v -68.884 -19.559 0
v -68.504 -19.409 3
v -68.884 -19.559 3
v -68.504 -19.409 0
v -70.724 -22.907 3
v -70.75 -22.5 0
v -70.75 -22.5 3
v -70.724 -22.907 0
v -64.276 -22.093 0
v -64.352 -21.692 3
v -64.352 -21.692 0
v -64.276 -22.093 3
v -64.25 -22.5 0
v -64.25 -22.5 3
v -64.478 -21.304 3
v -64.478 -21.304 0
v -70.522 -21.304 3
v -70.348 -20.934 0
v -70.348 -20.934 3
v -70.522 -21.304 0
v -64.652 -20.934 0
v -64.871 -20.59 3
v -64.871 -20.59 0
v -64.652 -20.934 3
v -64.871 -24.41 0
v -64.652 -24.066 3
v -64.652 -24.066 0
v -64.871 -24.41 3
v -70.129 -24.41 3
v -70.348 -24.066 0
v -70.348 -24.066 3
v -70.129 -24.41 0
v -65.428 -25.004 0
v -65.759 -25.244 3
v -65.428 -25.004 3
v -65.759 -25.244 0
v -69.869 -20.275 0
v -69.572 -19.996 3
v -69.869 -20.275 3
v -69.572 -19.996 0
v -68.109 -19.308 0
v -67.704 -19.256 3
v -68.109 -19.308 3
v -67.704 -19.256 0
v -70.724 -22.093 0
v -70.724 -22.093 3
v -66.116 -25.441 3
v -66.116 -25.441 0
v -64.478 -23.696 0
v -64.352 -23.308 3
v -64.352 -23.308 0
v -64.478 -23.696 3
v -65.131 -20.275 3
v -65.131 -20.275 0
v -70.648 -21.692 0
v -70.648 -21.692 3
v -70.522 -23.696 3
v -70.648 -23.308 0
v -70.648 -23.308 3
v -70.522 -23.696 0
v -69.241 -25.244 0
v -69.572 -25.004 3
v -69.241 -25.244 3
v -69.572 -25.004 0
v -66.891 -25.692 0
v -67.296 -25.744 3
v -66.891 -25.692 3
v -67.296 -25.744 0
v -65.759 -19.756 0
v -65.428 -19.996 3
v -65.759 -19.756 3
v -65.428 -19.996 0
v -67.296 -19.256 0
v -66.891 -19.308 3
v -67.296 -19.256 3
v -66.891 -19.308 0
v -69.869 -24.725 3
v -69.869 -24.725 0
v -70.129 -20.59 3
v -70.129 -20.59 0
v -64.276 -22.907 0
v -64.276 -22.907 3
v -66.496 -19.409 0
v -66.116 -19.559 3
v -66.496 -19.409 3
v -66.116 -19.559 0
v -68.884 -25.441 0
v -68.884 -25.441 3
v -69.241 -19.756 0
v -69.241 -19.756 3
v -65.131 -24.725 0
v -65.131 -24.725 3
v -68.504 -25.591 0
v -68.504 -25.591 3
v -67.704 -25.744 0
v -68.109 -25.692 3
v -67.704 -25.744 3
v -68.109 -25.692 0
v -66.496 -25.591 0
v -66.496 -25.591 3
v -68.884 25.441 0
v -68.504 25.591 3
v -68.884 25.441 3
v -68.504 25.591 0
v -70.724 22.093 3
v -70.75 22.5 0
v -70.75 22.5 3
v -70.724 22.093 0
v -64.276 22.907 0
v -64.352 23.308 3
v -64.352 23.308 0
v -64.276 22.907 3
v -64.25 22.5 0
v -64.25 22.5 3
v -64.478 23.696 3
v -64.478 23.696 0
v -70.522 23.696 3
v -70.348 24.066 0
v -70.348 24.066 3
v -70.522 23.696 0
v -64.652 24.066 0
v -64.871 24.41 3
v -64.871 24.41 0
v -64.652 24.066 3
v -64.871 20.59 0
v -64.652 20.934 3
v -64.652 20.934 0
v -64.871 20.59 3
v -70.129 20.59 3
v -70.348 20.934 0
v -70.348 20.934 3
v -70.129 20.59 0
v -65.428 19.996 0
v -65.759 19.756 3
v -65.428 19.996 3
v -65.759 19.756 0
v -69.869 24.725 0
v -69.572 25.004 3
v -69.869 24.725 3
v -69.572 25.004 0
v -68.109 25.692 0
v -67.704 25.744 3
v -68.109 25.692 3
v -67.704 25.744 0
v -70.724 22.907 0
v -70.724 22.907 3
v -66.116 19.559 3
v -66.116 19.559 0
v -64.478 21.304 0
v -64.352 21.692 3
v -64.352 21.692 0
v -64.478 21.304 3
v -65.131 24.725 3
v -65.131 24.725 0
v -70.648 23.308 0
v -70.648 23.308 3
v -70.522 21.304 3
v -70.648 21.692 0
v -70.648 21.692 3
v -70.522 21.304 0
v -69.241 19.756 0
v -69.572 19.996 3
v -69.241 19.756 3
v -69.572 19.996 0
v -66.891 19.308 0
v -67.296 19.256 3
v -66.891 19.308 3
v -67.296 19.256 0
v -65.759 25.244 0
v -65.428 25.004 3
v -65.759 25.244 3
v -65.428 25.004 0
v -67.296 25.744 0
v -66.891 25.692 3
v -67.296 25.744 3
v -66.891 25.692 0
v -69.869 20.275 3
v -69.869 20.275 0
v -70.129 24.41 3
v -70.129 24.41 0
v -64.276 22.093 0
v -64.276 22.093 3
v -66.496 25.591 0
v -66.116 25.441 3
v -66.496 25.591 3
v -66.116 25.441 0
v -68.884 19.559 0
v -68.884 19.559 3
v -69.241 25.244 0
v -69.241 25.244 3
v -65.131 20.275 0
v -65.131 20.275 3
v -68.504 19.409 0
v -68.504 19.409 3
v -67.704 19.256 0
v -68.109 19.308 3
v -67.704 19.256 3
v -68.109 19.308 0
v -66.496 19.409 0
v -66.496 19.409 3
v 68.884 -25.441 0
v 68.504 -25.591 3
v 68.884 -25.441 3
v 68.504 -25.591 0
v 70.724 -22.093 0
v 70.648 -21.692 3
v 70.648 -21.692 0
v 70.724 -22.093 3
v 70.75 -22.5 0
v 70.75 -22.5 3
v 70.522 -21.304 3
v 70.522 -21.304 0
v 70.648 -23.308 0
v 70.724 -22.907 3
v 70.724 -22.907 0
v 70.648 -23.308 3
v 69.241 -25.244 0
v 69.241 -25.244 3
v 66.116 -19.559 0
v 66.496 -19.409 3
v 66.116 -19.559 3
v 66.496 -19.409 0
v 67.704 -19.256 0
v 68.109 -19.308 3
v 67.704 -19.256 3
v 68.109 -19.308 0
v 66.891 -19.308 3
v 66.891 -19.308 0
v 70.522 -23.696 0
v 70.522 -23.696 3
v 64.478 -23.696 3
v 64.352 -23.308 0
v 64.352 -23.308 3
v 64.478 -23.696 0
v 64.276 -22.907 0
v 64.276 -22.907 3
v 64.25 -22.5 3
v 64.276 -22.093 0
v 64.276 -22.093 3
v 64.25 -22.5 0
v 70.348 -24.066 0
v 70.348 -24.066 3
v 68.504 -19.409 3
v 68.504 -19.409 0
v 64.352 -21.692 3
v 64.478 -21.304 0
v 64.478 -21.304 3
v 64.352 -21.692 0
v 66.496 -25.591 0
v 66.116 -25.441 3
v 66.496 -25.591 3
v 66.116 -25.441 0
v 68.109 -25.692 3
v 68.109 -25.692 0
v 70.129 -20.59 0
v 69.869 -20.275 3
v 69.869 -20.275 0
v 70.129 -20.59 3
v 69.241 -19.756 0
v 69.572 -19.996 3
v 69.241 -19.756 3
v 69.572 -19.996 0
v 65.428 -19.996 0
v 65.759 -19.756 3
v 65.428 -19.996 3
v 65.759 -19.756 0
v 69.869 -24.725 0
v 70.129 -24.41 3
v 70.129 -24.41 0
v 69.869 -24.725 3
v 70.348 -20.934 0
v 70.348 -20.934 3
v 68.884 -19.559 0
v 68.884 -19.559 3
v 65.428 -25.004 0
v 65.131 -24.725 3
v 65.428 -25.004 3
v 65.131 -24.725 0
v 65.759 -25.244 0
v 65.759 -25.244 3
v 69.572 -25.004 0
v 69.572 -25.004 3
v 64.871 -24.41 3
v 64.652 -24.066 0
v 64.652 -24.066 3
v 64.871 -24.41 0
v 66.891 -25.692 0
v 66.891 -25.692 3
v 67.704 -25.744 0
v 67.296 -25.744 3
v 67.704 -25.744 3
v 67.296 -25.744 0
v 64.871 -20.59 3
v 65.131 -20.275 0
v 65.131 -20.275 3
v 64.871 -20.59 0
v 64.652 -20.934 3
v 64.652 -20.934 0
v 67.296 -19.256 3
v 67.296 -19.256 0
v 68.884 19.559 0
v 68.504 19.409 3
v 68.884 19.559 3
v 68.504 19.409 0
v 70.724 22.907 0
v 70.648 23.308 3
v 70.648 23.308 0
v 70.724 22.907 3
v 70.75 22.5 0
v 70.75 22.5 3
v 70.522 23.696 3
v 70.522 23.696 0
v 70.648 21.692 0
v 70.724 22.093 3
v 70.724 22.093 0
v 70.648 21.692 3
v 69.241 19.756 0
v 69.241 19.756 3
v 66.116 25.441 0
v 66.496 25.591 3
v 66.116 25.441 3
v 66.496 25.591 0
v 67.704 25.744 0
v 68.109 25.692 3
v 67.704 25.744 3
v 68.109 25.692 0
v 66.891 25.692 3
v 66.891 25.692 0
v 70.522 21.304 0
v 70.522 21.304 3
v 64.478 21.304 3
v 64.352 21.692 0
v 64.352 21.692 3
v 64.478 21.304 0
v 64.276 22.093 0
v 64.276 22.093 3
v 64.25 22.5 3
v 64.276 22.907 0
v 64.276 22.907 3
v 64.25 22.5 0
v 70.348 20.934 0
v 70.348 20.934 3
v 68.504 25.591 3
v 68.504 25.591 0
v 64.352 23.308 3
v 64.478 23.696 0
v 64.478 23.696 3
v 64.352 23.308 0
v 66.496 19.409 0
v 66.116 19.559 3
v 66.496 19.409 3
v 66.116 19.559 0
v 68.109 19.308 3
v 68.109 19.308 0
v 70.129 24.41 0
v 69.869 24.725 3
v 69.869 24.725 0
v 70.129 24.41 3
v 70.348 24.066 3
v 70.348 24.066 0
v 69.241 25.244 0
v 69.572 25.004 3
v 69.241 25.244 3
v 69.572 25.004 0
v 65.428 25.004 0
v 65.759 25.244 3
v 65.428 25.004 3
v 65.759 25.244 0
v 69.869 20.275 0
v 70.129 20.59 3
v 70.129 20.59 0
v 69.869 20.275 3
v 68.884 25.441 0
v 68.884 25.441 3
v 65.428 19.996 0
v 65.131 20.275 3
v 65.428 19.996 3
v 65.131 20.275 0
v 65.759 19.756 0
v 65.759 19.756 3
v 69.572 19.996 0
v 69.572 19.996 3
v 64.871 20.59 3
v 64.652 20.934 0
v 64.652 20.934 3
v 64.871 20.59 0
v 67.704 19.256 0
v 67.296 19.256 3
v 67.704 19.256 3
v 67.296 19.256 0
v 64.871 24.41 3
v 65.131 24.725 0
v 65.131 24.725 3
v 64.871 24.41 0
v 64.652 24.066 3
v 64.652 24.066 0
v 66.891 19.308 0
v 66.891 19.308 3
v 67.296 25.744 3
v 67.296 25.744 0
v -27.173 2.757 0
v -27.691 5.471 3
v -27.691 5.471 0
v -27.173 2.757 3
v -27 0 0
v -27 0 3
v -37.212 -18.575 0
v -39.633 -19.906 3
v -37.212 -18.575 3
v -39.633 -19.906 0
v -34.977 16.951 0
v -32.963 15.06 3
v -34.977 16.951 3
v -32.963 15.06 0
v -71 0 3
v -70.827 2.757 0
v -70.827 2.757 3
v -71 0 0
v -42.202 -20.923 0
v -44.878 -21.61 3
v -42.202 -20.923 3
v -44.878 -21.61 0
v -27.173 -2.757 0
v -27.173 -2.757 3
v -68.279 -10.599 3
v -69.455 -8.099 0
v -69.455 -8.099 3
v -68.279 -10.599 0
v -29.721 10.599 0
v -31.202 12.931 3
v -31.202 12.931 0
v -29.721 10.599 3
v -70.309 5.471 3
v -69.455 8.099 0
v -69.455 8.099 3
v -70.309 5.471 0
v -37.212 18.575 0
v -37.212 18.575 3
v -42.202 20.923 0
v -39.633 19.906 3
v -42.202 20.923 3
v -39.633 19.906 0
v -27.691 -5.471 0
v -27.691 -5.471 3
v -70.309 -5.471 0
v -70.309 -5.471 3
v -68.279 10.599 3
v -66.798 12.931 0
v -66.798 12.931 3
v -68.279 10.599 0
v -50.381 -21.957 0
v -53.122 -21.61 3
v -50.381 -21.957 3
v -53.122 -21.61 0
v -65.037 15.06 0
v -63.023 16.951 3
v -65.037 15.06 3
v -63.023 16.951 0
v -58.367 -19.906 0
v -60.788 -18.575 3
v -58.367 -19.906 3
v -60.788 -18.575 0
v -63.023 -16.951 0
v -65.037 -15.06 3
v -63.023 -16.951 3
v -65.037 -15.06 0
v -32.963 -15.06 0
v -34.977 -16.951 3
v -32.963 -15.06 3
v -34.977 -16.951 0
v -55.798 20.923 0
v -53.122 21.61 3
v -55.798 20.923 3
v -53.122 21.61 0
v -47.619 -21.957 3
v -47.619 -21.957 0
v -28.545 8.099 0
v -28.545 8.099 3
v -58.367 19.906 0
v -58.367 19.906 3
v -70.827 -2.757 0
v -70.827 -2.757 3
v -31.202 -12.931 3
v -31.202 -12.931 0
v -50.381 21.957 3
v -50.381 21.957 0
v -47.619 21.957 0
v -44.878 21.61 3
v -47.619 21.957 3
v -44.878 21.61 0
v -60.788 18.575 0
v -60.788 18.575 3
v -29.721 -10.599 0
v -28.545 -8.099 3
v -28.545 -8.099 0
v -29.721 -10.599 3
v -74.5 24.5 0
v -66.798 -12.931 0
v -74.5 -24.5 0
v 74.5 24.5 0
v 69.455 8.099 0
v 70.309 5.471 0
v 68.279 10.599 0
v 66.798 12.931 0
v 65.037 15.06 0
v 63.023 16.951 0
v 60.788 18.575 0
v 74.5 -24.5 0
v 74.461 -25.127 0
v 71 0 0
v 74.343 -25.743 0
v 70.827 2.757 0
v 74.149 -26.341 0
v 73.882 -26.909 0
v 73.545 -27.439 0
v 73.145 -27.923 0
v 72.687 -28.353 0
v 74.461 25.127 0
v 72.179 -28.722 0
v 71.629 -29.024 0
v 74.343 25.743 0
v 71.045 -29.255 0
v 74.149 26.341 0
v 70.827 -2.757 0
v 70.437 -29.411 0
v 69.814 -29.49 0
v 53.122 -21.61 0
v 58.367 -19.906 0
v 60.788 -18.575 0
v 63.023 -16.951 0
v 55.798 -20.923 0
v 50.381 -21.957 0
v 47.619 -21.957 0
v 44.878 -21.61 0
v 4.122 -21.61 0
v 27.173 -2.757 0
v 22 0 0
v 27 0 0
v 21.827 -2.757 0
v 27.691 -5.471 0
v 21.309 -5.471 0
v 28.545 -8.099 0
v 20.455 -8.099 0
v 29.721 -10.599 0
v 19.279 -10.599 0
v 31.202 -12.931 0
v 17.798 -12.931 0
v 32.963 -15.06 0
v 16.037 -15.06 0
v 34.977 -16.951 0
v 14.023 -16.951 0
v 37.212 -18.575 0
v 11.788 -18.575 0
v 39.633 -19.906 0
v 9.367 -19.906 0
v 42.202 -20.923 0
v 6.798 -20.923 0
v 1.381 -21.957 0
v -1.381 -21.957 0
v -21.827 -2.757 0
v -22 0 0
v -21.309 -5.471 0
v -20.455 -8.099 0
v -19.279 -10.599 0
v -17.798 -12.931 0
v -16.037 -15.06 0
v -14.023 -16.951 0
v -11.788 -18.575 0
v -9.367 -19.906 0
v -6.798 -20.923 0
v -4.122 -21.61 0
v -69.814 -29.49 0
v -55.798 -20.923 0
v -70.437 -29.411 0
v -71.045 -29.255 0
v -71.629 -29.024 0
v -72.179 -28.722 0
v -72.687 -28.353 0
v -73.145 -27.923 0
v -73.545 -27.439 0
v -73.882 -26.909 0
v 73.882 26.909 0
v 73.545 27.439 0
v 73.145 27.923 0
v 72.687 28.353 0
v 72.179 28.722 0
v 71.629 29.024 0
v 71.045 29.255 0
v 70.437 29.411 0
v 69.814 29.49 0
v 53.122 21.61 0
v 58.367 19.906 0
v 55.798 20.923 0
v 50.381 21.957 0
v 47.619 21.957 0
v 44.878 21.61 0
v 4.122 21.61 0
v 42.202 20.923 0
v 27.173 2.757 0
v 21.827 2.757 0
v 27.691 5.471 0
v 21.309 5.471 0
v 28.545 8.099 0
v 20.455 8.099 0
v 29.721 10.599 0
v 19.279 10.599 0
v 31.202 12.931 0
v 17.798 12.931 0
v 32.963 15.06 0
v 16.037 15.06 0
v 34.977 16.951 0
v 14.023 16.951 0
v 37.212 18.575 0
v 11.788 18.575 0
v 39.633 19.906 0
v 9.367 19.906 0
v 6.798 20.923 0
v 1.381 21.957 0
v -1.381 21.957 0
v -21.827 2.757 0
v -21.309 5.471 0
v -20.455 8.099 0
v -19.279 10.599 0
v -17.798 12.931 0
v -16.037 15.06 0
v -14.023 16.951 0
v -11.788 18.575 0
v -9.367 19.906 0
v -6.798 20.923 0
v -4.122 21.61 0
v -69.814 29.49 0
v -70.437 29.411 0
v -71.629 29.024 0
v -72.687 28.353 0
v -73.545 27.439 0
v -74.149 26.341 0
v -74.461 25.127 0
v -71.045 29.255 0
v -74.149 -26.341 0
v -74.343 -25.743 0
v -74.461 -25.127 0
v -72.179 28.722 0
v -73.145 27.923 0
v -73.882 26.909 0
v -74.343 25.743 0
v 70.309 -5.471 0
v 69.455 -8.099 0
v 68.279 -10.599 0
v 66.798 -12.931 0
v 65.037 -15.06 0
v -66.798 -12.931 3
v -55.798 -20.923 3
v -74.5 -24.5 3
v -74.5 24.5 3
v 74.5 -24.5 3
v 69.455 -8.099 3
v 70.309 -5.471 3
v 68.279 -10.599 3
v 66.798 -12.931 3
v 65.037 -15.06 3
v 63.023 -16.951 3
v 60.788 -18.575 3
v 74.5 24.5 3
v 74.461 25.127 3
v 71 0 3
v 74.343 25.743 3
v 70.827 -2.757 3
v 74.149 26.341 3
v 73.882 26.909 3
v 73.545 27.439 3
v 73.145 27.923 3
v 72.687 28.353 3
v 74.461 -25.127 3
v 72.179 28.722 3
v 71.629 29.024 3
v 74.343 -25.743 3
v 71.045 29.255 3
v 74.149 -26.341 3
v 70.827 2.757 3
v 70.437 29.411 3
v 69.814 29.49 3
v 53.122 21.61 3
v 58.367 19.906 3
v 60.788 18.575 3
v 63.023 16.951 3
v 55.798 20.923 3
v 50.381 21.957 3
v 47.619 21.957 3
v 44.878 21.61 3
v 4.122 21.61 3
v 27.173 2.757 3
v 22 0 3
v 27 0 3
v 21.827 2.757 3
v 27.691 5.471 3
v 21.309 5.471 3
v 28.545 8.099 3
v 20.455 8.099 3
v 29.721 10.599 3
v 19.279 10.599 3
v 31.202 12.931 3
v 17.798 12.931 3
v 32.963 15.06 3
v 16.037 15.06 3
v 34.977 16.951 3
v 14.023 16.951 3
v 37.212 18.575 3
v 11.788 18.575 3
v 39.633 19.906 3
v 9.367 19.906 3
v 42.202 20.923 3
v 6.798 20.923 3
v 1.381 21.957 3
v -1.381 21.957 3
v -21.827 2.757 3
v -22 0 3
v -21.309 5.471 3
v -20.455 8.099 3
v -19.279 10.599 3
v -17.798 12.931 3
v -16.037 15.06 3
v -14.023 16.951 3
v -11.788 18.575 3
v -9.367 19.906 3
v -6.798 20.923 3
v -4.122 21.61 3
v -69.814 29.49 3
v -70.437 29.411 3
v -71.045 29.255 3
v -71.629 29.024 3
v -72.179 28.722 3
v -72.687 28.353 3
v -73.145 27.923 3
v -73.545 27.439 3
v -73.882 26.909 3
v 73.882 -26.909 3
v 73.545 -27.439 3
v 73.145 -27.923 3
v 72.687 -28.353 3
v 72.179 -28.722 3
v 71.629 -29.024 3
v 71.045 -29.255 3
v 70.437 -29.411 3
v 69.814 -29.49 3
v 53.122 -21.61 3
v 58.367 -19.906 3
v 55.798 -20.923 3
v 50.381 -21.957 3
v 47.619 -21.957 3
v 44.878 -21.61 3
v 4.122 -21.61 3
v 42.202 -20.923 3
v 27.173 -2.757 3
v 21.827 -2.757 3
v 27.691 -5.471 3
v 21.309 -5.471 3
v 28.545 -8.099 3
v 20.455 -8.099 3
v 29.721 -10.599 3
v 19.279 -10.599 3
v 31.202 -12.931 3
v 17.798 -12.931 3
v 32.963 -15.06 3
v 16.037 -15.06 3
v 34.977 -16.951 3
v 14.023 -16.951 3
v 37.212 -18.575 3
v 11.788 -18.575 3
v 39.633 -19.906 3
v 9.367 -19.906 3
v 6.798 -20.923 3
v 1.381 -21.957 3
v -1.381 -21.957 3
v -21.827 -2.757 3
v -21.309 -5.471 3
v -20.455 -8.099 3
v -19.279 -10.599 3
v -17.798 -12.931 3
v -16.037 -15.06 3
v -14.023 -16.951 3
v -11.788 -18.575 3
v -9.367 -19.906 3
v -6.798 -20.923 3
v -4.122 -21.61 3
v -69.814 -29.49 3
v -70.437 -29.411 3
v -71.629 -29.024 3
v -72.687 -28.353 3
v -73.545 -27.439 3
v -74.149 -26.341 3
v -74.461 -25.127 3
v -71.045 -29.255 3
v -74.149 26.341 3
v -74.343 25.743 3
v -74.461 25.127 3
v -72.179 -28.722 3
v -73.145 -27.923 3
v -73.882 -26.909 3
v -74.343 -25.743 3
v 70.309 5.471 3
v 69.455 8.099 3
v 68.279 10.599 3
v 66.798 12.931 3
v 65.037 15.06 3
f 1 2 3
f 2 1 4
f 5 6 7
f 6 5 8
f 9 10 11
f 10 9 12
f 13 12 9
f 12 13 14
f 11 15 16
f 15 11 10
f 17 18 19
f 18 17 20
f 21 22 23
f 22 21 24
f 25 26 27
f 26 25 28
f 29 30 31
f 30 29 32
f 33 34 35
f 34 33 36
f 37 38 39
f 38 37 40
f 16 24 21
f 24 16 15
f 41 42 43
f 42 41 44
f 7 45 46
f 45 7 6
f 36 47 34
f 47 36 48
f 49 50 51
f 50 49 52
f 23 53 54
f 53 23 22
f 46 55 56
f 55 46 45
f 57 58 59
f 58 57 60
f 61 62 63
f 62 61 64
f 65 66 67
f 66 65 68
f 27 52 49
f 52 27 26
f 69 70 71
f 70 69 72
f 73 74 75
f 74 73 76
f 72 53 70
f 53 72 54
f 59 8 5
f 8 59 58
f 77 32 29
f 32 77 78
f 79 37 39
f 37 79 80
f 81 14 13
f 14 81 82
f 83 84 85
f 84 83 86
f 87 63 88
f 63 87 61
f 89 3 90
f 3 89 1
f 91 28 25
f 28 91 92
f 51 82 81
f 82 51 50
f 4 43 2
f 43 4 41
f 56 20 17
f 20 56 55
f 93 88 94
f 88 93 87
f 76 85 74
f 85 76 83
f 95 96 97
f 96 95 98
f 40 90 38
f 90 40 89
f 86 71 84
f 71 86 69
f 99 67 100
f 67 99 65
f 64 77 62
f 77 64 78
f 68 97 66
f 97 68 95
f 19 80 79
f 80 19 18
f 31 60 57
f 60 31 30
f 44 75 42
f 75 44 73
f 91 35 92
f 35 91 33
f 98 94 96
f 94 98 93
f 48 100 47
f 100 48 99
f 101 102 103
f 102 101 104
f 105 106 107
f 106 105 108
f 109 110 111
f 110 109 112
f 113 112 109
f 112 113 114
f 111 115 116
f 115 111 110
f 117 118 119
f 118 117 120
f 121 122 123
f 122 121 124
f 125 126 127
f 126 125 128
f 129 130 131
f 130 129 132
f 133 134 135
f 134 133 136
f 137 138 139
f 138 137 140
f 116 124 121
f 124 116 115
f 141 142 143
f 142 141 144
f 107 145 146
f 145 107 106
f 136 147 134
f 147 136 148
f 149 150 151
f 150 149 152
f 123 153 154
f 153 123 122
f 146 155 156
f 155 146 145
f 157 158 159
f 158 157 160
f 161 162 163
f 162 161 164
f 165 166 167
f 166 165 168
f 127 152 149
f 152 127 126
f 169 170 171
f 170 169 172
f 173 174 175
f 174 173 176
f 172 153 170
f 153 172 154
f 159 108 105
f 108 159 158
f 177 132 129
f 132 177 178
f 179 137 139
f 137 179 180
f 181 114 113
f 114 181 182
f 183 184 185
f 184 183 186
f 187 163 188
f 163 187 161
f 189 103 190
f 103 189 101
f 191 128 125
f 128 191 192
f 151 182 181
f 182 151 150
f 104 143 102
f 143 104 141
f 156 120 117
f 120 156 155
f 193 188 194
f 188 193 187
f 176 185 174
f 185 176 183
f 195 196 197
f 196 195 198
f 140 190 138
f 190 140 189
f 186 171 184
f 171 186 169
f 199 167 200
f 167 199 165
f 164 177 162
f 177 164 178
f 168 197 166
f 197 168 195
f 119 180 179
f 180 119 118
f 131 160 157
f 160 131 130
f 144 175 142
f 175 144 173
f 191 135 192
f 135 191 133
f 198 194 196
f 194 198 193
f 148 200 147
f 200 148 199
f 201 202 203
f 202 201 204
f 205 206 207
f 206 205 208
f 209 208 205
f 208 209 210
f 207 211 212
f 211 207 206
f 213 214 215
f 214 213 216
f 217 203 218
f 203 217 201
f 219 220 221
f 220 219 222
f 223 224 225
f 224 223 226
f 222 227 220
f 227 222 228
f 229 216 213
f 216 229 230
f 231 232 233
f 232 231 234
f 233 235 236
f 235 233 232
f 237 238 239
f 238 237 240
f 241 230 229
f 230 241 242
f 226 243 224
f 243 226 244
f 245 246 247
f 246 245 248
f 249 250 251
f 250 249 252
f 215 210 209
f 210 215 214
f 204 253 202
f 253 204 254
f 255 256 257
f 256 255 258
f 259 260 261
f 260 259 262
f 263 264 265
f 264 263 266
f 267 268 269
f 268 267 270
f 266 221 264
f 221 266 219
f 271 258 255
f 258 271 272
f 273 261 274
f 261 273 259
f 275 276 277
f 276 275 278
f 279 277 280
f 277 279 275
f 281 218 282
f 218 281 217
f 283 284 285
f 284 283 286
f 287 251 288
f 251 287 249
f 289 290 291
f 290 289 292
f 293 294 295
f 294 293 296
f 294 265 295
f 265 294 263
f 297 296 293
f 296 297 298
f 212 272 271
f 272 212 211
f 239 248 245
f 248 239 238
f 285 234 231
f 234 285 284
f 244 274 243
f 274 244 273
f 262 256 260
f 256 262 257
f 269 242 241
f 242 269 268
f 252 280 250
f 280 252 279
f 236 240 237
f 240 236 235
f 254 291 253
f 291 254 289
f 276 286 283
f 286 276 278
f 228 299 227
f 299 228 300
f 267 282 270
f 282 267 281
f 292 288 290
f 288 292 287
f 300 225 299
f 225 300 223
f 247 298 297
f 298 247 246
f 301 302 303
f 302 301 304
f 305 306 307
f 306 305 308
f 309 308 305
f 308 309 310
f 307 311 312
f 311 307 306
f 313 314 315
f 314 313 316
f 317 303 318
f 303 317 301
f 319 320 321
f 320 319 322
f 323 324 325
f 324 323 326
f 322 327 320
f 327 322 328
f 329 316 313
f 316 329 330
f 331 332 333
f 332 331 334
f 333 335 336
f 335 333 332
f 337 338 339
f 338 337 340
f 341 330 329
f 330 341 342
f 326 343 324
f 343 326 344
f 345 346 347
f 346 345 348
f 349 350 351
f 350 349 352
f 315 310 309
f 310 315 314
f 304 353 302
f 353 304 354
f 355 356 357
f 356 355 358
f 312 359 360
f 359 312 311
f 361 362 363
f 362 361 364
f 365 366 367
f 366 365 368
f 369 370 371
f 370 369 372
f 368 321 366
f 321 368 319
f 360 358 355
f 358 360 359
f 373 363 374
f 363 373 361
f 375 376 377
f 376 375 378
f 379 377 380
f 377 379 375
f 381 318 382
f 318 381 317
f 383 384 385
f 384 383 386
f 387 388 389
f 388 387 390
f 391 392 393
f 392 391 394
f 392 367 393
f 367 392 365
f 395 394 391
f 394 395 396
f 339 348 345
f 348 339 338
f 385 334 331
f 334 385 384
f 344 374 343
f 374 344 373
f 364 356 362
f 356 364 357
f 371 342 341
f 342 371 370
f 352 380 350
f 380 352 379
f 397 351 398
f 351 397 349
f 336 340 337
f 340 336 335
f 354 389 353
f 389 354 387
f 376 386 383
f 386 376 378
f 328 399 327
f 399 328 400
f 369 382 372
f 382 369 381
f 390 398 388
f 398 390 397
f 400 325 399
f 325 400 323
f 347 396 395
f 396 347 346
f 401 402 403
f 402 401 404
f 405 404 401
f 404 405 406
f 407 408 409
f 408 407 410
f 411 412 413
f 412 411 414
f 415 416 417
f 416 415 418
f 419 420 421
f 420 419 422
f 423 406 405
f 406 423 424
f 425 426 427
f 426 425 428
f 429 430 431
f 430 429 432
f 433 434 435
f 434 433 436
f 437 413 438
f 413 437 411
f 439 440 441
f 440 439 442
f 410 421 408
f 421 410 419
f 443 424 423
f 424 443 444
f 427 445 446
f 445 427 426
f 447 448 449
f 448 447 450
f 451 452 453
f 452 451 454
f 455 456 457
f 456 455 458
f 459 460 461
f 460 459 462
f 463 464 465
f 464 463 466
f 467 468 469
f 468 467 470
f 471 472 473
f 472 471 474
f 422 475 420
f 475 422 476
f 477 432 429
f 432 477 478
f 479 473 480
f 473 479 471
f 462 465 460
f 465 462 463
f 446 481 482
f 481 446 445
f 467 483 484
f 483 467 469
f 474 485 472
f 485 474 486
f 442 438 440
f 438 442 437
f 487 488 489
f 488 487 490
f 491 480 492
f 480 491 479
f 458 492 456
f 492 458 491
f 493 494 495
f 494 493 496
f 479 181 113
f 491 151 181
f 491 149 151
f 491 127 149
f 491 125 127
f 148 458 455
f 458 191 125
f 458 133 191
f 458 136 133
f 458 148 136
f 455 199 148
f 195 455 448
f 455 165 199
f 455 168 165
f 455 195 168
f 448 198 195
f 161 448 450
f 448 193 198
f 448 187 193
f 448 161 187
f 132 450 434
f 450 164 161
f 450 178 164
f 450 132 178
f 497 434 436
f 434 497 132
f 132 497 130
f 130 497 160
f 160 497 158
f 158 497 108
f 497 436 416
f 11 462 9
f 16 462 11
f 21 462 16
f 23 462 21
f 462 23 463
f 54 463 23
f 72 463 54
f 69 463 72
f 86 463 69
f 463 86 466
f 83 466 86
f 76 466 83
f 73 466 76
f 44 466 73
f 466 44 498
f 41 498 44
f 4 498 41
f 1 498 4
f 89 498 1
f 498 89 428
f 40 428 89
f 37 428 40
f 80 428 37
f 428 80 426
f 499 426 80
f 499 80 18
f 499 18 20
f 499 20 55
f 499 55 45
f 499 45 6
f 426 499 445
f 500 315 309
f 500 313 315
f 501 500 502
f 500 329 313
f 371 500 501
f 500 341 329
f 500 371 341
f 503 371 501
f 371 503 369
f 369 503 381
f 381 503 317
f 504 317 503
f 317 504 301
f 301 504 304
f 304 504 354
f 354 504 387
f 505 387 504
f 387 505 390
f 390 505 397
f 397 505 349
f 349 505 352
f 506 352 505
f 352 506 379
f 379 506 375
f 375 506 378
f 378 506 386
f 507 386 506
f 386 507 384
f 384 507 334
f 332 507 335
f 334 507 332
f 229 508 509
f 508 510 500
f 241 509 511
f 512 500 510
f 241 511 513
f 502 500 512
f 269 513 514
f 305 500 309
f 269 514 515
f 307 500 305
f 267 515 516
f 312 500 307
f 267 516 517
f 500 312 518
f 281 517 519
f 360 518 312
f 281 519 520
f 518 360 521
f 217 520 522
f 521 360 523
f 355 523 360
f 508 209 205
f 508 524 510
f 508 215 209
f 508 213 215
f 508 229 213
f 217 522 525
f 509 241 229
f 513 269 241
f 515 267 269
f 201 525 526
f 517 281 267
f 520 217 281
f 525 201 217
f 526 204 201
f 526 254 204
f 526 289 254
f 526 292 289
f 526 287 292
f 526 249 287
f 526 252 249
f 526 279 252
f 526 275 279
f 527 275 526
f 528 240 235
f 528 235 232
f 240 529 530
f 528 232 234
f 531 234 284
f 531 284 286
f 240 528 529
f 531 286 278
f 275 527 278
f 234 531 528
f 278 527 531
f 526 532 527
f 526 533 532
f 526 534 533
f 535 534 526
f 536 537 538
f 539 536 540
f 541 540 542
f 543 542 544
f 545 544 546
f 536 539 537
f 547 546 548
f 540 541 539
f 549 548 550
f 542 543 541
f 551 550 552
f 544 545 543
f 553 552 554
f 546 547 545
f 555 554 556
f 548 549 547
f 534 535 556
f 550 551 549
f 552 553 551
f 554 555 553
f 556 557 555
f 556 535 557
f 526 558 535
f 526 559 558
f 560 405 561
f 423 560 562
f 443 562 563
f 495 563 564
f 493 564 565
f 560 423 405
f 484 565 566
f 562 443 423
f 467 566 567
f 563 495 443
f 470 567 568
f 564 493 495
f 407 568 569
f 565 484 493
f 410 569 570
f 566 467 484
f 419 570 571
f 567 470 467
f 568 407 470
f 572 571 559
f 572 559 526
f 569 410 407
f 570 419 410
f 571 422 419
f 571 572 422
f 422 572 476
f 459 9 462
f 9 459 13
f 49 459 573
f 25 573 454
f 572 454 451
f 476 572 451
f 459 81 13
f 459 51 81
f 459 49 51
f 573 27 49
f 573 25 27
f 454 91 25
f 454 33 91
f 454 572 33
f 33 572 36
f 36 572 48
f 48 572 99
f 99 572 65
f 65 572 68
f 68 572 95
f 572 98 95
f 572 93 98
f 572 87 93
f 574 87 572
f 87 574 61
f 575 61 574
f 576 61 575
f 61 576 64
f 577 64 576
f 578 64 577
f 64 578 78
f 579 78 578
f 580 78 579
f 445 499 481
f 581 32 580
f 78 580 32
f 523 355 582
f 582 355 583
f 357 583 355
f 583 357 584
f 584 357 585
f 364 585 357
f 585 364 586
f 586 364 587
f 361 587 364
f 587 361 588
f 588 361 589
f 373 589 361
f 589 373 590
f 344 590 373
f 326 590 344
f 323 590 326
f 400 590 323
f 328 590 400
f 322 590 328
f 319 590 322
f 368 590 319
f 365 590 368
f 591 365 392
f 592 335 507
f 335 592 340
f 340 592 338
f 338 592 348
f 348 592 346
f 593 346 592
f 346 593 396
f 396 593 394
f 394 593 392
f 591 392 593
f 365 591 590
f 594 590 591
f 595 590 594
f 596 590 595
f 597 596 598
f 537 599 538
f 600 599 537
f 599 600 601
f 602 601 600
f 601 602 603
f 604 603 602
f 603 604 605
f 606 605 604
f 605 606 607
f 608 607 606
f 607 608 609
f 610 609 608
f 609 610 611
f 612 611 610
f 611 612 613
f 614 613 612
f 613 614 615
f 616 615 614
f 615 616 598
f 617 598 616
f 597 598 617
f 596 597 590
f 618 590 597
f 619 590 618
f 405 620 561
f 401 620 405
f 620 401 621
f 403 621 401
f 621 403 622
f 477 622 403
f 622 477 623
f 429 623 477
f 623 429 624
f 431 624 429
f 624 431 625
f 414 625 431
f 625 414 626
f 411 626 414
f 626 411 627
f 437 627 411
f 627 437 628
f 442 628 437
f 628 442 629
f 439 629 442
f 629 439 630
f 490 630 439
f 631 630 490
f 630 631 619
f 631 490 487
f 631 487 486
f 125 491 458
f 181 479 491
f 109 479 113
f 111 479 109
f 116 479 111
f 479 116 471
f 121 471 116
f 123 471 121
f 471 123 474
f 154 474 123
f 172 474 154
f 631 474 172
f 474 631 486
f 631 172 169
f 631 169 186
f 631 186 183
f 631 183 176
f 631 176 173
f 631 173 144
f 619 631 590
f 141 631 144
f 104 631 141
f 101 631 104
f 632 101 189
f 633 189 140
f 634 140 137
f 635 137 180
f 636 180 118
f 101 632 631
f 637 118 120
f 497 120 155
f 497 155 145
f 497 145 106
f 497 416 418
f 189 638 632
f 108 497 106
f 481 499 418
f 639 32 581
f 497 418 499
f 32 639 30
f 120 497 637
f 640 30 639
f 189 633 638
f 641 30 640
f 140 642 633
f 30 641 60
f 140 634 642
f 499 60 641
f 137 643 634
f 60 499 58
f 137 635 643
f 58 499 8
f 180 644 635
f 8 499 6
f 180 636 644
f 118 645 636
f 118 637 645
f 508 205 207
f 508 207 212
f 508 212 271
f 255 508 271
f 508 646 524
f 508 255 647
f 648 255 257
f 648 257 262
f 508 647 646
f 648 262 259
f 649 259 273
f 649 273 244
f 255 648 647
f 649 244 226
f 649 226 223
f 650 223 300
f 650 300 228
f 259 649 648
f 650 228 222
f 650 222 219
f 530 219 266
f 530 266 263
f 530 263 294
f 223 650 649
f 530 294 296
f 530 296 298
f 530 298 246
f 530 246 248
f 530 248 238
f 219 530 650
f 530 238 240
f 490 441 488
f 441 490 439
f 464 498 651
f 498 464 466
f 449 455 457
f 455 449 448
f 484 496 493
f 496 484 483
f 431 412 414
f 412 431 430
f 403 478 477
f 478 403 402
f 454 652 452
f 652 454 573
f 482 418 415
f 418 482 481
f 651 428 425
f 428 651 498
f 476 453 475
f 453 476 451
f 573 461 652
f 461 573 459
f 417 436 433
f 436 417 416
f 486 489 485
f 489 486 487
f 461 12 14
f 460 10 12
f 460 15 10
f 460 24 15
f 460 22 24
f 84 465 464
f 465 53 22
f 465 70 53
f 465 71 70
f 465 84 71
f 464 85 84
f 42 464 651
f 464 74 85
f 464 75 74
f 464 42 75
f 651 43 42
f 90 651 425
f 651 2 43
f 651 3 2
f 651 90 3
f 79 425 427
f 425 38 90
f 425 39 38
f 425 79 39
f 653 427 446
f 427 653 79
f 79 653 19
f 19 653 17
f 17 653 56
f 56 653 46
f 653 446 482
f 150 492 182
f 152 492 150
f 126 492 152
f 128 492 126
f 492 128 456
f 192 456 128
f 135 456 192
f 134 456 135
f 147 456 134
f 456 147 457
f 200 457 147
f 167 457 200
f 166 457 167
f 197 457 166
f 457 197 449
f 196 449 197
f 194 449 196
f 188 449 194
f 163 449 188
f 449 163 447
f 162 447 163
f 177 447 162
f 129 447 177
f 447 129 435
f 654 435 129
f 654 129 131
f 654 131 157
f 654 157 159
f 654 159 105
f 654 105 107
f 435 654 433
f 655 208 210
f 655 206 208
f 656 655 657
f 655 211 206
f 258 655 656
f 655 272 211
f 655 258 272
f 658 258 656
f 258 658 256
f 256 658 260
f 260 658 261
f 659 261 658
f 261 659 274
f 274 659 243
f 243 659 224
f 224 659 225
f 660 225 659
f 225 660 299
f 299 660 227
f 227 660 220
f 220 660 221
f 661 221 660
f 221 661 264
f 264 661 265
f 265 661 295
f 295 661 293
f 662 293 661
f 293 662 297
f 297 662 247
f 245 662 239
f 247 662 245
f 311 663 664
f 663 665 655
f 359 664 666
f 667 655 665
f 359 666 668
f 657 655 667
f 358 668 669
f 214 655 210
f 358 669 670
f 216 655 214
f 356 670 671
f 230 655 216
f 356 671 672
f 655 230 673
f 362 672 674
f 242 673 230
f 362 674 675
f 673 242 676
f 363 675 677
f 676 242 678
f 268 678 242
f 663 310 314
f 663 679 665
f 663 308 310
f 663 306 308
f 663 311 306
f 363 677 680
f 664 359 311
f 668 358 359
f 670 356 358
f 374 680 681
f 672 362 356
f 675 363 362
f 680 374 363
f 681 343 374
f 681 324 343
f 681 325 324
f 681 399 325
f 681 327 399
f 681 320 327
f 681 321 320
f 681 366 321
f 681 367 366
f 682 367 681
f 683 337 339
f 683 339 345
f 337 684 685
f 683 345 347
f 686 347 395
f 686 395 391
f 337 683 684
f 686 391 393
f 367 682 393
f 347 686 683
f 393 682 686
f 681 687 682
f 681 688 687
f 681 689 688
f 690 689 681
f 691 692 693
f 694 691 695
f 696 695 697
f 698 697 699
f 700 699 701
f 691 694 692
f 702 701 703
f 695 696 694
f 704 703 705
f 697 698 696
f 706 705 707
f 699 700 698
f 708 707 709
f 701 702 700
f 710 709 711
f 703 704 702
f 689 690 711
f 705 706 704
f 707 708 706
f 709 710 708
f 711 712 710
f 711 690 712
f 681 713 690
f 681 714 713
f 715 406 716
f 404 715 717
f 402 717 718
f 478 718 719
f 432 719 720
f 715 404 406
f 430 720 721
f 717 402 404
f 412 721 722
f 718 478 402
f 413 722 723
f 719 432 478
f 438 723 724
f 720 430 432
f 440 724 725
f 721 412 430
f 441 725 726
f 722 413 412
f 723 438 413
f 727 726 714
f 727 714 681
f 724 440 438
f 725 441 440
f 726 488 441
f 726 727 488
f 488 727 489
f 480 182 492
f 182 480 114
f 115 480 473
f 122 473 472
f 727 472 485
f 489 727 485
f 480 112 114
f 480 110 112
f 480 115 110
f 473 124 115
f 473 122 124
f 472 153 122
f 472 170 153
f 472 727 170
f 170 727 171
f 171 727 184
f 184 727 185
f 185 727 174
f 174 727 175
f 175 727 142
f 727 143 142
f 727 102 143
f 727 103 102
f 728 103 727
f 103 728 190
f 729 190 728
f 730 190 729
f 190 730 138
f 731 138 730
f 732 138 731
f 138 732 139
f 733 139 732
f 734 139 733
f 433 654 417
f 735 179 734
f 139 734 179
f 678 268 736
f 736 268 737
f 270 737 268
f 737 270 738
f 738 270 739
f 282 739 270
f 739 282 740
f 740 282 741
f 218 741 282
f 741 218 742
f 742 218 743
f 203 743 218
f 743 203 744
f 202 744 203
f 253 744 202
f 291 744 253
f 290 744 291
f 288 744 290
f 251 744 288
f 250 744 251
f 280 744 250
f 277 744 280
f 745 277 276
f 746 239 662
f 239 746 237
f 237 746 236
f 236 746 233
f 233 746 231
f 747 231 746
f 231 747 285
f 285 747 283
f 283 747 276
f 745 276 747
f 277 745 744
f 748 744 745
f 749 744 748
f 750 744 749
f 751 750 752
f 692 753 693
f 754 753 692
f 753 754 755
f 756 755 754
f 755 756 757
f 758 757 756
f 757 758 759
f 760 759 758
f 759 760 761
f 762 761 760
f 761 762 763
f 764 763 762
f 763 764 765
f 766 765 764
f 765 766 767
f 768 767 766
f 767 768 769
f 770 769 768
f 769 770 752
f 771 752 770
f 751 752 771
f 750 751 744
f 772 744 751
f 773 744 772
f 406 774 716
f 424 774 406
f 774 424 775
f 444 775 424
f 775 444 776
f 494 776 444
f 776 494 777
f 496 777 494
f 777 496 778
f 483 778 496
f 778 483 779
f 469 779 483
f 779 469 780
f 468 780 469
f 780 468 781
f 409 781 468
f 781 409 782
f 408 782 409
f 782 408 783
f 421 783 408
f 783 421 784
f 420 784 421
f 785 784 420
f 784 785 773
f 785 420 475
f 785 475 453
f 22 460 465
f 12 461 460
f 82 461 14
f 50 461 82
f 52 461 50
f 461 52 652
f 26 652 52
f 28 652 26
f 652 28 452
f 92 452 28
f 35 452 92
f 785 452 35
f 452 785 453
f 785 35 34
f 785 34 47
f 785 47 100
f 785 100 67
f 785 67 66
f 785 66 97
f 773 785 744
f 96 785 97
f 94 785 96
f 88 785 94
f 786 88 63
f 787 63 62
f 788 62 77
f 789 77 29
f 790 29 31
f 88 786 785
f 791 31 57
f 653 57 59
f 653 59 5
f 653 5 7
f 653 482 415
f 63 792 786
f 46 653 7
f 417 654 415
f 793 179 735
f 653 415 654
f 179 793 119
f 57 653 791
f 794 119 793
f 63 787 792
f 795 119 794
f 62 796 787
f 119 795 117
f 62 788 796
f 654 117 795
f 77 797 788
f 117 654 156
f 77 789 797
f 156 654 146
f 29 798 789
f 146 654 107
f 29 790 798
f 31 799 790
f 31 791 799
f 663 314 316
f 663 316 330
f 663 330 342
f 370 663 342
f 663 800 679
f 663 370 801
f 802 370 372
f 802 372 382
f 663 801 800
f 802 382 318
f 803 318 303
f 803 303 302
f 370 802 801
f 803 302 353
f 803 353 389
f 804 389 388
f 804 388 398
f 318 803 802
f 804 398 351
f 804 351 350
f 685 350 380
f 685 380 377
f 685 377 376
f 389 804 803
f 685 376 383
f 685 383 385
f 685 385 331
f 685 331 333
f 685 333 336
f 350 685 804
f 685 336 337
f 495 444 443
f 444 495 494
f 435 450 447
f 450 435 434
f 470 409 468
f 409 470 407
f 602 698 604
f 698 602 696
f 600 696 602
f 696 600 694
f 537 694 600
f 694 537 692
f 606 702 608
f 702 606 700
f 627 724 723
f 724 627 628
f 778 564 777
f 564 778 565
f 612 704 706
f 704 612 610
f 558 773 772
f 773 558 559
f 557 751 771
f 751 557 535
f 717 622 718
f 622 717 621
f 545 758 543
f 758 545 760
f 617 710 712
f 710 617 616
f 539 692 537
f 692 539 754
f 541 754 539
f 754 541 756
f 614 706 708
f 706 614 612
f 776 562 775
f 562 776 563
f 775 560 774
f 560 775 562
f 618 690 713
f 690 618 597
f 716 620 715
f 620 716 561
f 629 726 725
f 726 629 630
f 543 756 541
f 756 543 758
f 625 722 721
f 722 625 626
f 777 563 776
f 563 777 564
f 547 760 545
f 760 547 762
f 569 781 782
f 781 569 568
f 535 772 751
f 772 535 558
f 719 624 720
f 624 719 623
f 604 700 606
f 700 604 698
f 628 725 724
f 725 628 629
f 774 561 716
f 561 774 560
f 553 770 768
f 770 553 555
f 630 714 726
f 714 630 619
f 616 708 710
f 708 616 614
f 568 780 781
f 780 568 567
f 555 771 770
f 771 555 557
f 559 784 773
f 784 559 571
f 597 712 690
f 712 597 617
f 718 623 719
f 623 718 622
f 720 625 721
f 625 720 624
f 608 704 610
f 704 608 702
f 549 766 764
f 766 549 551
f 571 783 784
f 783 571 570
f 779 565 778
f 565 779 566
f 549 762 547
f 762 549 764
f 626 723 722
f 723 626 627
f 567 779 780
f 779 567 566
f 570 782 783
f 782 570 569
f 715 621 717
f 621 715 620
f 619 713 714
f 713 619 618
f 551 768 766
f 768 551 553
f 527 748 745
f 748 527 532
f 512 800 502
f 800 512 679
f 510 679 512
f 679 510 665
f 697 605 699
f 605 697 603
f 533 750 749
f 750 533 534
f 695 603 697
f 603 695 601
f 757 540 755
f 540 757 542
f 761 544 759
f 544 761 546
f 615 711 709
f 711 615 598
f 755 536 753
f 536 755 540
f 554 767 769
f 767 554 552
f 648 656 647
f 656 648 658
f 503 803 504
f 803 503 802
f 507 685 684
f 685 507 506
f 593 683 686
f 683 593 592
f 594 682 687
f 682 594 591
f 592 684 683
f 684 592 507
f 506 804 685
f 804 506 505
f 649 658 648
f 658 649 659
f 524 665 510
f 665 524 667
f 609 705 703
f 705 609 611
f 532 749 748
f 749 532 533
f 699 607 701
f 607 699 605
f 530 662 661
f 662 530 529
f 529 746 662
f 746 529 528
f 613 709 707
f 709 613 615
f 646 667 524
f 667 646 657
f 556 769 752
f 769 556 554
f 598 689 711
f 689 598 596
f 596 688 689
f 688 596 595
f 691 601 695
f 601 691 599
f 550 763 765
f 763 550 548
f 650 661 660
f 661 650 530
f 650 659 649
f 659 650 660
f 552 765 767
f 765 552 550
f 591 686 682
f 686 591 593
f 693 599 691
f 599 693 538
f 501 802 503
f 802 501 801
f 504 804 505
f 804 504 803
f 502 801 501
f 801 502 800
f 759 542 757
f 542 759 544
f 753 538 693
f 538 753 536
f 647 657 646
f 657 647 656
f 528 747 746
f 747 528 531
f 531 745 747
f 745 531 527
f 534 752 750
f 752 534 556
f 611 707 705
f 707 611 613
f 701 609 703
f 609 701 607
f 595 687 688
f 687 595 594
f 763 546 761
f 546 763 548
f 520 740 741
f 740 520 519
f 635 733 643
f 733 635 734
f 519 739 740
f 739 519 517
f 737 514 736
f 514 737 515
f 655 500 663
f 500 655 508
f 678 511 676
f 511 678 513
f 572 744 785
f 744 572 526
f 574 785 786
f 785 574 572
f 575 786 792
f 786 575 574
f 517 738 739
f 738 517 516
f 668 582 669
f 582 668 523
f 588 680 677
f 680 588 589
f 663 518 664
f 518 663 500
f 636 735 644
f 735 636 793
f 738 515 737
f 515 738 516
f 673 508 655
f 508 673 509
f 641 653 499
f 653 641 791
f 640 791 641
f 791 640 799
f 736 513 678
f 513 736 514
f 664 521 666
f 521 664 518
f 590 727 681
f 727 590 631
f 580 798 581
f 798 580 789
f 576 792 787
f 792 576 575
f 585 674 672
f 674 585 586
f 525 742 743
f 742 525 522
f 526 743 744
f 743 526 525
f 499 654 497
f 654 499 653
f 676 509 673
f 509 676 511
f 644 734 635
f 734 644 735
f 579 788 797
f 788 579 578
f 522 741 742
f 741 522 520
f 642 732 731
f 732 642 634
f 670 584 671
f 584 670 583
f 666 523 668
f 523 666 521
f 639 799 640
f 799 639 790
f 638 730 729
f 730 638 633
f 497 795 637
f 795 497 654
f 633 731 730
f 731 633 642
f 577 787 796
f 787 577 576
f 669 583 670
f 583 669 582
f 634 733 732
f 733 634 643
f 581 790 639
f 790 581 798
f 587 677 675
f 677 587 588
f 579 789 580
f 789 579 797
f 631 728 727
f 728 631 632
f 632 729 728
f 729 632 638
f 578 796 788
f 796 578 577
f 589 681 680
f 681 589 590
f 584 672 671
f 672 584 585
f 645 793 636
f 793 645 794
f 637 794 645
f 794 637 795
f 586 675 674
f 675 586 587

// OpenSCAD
$fn = 50;


difference() {
	union() {
		hull() {
			translate(v = [-69.5000000000, 24.5000000000, 0]) {
				cylinder(h = 3, r = 5);
			}
			translate(v = [69.5000000000, 24.5000000000, 0]) {
				cylinder(h = 3, r = 5);
			}
			translate(v = [-69.5000000000, -24.5000000000, 0]) {
				cylinder(h = 3, r = 5);
			}
			translate(v = [69.5000000000, -24.5000000000, 0]) {
				cylinder(h = 3, r = 5);
			}
		}
	}
	union() {
		#translate(v = [-67.5000000000, -22.5000000000, -100.0000000000]) {
			cylinder(h = 200, r = 3.2500000000);
		}
		#translate(v = [-67.5000000000, 22.5000000000, -100.0000000000]) {
			cylinder(h = 200, r = 3.2500000000);
		}
		#translate(v = [67.5000000000, -22.5000000000, -100.0000000000]) {
			cylinder(h = 200, r = 3.2500000000);
		}
		#translate(v = [67.5000000000, 22.5000000000, -100.0000000000]) {
			cylinder(h = 200, r = 3.2500000000);
		}
		#translate(v = [-49.0000000000, 0, 0]) {
			cylinder(h = 3, r = 22.0000000000);
		}
		#cylinder(h = 3, r = 22.0000000000);
		#translate(v = [49.0000000000, 0, 0]) {
			cylinder(h = 3, r = 22.0000000000);
		}
	}
}
